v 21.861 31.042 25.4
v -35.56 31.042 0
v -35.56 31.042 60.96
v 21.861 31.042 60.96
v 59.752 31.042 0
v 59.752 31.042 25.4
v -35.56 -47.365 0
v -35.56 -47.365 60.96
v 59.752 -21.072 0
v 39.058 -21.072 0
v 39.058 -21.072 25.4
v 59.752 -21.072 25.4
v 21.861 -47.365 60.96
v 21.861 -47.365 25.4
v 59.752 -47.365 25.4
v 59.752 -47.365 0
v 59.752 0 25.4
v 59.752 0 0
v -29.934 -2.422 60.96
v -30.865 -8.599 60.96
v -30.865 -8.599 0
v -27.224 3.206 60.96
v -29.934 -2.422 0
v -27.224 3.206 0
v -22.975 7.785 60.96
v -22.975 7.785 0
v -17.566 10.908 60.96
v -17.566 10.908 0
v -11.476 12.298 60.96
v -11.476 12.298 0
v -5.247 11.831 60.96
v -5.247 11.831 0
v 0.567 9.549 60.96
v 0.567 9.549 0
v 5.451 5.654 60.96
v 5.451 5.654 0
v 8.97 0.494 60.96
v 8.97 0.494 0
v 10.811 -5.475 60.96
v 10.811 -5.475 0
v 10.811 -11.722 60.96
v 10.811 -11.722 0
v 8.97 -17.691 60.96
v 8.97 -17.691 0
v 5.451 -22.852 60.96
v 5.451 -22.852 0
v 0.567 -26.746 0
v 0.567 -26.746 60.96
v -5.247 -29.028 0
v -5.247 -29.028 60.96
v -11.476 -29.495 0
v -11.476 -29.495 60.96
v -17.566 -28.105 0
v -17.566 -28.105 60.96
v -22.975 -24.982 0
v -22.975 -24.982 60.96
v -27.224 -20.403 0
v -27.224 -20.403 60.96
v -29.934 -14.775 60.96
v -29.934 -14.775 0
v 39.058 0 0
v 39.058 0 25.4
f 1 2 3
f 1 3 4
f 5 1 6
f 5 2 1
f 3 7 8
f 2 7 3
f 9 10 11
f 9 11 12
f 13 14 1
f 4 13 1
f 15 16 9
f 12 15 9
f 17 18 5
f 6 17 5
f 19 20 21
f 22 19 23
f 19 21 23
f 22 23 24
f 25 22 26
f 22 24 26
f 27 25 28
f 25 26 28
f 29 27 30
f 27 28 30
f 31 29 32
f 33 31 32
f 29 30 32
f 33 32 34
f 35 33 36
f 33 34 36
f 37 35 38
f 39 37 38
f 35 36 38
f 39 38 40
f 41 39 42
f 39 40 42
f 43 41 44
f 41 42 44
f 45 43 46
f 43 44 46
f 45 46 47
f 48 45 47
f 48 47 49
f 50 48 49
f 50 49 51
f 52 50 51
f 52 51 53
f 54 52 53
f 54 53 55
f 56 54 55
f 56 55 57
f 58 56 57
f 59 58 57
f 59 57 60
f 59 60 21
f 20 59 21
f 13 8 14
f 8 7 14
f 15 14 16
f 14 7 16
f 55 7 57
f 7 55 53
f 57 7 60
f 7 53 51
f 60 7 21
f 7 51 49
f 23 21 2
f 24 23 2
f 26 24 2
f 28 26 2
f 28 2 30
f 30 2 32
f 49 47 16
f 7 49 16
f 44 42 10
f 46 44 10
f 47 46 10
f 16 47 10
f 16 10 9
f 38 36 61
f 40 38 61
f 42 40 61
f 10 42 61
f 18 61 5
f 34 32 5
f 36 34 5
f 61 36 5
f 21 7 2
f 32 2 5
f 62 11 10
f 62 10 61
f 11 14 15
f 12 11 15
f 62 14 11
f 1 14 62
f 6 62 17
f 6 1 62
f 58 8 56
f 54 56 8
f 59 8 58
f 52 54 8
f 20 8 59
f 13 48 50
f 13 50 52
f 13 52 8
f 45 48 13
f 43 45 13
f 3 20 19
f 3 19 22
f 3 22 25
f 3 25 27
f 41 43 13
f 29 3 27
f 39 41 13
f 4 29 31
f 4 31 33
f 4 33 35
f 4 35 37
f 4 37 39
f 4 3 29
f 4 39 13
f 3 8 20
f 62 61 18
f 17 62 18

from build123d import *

# Parameters (mm, degrees)
F0_W     = 95.312461257
F0_H     = 78.4068834037
F1_DEPTH = 25.4
F2_W     = 20.6947550178
F2_H     = 21.0718084127
F3_DEPTH = 25.4
F4_W     = 57.420656085
F4_H     = 78.4068834037
F5_DEPTH = 35.56
F8_D     = 41.91


with BuildPart() as f1:
    # F0 (on Top) → F1 (new body)
    with BuildSketch(Plane.XY):
        with Locations((12.0962299407, -8.1613110378)):
            Rectangle(F0_W, F0_H)
    extrude(amount=F1_DEPTH)

    # F2 (on face) → F3 (cut)
    with BuildSketch(Plane.XY.offset(25.4)):
        with Locations((49.4050830603, -10.5359042063)):
            Rectangle(F2_W, F2_H)
    extrude(amount=-F3_DEPTH, mode=Mode.SUBTRACT)

    # F4 (on face) → F5 (join)
    with BuildSketch(Plane.XY.offset(25.4)):
        with Locations((-6.8496726453, -8.1613110378)):
            Rectangle(F4_W, F4_H)
    extrude(amount=F5_DEPTH)

    # F8 (through all)
    with Locations(Plane.XY.offset(60.96)):
        with Locations((-9.9101644009, -8.5985241458)):
            Hole(F8_D / 2)


solid = f1.part
